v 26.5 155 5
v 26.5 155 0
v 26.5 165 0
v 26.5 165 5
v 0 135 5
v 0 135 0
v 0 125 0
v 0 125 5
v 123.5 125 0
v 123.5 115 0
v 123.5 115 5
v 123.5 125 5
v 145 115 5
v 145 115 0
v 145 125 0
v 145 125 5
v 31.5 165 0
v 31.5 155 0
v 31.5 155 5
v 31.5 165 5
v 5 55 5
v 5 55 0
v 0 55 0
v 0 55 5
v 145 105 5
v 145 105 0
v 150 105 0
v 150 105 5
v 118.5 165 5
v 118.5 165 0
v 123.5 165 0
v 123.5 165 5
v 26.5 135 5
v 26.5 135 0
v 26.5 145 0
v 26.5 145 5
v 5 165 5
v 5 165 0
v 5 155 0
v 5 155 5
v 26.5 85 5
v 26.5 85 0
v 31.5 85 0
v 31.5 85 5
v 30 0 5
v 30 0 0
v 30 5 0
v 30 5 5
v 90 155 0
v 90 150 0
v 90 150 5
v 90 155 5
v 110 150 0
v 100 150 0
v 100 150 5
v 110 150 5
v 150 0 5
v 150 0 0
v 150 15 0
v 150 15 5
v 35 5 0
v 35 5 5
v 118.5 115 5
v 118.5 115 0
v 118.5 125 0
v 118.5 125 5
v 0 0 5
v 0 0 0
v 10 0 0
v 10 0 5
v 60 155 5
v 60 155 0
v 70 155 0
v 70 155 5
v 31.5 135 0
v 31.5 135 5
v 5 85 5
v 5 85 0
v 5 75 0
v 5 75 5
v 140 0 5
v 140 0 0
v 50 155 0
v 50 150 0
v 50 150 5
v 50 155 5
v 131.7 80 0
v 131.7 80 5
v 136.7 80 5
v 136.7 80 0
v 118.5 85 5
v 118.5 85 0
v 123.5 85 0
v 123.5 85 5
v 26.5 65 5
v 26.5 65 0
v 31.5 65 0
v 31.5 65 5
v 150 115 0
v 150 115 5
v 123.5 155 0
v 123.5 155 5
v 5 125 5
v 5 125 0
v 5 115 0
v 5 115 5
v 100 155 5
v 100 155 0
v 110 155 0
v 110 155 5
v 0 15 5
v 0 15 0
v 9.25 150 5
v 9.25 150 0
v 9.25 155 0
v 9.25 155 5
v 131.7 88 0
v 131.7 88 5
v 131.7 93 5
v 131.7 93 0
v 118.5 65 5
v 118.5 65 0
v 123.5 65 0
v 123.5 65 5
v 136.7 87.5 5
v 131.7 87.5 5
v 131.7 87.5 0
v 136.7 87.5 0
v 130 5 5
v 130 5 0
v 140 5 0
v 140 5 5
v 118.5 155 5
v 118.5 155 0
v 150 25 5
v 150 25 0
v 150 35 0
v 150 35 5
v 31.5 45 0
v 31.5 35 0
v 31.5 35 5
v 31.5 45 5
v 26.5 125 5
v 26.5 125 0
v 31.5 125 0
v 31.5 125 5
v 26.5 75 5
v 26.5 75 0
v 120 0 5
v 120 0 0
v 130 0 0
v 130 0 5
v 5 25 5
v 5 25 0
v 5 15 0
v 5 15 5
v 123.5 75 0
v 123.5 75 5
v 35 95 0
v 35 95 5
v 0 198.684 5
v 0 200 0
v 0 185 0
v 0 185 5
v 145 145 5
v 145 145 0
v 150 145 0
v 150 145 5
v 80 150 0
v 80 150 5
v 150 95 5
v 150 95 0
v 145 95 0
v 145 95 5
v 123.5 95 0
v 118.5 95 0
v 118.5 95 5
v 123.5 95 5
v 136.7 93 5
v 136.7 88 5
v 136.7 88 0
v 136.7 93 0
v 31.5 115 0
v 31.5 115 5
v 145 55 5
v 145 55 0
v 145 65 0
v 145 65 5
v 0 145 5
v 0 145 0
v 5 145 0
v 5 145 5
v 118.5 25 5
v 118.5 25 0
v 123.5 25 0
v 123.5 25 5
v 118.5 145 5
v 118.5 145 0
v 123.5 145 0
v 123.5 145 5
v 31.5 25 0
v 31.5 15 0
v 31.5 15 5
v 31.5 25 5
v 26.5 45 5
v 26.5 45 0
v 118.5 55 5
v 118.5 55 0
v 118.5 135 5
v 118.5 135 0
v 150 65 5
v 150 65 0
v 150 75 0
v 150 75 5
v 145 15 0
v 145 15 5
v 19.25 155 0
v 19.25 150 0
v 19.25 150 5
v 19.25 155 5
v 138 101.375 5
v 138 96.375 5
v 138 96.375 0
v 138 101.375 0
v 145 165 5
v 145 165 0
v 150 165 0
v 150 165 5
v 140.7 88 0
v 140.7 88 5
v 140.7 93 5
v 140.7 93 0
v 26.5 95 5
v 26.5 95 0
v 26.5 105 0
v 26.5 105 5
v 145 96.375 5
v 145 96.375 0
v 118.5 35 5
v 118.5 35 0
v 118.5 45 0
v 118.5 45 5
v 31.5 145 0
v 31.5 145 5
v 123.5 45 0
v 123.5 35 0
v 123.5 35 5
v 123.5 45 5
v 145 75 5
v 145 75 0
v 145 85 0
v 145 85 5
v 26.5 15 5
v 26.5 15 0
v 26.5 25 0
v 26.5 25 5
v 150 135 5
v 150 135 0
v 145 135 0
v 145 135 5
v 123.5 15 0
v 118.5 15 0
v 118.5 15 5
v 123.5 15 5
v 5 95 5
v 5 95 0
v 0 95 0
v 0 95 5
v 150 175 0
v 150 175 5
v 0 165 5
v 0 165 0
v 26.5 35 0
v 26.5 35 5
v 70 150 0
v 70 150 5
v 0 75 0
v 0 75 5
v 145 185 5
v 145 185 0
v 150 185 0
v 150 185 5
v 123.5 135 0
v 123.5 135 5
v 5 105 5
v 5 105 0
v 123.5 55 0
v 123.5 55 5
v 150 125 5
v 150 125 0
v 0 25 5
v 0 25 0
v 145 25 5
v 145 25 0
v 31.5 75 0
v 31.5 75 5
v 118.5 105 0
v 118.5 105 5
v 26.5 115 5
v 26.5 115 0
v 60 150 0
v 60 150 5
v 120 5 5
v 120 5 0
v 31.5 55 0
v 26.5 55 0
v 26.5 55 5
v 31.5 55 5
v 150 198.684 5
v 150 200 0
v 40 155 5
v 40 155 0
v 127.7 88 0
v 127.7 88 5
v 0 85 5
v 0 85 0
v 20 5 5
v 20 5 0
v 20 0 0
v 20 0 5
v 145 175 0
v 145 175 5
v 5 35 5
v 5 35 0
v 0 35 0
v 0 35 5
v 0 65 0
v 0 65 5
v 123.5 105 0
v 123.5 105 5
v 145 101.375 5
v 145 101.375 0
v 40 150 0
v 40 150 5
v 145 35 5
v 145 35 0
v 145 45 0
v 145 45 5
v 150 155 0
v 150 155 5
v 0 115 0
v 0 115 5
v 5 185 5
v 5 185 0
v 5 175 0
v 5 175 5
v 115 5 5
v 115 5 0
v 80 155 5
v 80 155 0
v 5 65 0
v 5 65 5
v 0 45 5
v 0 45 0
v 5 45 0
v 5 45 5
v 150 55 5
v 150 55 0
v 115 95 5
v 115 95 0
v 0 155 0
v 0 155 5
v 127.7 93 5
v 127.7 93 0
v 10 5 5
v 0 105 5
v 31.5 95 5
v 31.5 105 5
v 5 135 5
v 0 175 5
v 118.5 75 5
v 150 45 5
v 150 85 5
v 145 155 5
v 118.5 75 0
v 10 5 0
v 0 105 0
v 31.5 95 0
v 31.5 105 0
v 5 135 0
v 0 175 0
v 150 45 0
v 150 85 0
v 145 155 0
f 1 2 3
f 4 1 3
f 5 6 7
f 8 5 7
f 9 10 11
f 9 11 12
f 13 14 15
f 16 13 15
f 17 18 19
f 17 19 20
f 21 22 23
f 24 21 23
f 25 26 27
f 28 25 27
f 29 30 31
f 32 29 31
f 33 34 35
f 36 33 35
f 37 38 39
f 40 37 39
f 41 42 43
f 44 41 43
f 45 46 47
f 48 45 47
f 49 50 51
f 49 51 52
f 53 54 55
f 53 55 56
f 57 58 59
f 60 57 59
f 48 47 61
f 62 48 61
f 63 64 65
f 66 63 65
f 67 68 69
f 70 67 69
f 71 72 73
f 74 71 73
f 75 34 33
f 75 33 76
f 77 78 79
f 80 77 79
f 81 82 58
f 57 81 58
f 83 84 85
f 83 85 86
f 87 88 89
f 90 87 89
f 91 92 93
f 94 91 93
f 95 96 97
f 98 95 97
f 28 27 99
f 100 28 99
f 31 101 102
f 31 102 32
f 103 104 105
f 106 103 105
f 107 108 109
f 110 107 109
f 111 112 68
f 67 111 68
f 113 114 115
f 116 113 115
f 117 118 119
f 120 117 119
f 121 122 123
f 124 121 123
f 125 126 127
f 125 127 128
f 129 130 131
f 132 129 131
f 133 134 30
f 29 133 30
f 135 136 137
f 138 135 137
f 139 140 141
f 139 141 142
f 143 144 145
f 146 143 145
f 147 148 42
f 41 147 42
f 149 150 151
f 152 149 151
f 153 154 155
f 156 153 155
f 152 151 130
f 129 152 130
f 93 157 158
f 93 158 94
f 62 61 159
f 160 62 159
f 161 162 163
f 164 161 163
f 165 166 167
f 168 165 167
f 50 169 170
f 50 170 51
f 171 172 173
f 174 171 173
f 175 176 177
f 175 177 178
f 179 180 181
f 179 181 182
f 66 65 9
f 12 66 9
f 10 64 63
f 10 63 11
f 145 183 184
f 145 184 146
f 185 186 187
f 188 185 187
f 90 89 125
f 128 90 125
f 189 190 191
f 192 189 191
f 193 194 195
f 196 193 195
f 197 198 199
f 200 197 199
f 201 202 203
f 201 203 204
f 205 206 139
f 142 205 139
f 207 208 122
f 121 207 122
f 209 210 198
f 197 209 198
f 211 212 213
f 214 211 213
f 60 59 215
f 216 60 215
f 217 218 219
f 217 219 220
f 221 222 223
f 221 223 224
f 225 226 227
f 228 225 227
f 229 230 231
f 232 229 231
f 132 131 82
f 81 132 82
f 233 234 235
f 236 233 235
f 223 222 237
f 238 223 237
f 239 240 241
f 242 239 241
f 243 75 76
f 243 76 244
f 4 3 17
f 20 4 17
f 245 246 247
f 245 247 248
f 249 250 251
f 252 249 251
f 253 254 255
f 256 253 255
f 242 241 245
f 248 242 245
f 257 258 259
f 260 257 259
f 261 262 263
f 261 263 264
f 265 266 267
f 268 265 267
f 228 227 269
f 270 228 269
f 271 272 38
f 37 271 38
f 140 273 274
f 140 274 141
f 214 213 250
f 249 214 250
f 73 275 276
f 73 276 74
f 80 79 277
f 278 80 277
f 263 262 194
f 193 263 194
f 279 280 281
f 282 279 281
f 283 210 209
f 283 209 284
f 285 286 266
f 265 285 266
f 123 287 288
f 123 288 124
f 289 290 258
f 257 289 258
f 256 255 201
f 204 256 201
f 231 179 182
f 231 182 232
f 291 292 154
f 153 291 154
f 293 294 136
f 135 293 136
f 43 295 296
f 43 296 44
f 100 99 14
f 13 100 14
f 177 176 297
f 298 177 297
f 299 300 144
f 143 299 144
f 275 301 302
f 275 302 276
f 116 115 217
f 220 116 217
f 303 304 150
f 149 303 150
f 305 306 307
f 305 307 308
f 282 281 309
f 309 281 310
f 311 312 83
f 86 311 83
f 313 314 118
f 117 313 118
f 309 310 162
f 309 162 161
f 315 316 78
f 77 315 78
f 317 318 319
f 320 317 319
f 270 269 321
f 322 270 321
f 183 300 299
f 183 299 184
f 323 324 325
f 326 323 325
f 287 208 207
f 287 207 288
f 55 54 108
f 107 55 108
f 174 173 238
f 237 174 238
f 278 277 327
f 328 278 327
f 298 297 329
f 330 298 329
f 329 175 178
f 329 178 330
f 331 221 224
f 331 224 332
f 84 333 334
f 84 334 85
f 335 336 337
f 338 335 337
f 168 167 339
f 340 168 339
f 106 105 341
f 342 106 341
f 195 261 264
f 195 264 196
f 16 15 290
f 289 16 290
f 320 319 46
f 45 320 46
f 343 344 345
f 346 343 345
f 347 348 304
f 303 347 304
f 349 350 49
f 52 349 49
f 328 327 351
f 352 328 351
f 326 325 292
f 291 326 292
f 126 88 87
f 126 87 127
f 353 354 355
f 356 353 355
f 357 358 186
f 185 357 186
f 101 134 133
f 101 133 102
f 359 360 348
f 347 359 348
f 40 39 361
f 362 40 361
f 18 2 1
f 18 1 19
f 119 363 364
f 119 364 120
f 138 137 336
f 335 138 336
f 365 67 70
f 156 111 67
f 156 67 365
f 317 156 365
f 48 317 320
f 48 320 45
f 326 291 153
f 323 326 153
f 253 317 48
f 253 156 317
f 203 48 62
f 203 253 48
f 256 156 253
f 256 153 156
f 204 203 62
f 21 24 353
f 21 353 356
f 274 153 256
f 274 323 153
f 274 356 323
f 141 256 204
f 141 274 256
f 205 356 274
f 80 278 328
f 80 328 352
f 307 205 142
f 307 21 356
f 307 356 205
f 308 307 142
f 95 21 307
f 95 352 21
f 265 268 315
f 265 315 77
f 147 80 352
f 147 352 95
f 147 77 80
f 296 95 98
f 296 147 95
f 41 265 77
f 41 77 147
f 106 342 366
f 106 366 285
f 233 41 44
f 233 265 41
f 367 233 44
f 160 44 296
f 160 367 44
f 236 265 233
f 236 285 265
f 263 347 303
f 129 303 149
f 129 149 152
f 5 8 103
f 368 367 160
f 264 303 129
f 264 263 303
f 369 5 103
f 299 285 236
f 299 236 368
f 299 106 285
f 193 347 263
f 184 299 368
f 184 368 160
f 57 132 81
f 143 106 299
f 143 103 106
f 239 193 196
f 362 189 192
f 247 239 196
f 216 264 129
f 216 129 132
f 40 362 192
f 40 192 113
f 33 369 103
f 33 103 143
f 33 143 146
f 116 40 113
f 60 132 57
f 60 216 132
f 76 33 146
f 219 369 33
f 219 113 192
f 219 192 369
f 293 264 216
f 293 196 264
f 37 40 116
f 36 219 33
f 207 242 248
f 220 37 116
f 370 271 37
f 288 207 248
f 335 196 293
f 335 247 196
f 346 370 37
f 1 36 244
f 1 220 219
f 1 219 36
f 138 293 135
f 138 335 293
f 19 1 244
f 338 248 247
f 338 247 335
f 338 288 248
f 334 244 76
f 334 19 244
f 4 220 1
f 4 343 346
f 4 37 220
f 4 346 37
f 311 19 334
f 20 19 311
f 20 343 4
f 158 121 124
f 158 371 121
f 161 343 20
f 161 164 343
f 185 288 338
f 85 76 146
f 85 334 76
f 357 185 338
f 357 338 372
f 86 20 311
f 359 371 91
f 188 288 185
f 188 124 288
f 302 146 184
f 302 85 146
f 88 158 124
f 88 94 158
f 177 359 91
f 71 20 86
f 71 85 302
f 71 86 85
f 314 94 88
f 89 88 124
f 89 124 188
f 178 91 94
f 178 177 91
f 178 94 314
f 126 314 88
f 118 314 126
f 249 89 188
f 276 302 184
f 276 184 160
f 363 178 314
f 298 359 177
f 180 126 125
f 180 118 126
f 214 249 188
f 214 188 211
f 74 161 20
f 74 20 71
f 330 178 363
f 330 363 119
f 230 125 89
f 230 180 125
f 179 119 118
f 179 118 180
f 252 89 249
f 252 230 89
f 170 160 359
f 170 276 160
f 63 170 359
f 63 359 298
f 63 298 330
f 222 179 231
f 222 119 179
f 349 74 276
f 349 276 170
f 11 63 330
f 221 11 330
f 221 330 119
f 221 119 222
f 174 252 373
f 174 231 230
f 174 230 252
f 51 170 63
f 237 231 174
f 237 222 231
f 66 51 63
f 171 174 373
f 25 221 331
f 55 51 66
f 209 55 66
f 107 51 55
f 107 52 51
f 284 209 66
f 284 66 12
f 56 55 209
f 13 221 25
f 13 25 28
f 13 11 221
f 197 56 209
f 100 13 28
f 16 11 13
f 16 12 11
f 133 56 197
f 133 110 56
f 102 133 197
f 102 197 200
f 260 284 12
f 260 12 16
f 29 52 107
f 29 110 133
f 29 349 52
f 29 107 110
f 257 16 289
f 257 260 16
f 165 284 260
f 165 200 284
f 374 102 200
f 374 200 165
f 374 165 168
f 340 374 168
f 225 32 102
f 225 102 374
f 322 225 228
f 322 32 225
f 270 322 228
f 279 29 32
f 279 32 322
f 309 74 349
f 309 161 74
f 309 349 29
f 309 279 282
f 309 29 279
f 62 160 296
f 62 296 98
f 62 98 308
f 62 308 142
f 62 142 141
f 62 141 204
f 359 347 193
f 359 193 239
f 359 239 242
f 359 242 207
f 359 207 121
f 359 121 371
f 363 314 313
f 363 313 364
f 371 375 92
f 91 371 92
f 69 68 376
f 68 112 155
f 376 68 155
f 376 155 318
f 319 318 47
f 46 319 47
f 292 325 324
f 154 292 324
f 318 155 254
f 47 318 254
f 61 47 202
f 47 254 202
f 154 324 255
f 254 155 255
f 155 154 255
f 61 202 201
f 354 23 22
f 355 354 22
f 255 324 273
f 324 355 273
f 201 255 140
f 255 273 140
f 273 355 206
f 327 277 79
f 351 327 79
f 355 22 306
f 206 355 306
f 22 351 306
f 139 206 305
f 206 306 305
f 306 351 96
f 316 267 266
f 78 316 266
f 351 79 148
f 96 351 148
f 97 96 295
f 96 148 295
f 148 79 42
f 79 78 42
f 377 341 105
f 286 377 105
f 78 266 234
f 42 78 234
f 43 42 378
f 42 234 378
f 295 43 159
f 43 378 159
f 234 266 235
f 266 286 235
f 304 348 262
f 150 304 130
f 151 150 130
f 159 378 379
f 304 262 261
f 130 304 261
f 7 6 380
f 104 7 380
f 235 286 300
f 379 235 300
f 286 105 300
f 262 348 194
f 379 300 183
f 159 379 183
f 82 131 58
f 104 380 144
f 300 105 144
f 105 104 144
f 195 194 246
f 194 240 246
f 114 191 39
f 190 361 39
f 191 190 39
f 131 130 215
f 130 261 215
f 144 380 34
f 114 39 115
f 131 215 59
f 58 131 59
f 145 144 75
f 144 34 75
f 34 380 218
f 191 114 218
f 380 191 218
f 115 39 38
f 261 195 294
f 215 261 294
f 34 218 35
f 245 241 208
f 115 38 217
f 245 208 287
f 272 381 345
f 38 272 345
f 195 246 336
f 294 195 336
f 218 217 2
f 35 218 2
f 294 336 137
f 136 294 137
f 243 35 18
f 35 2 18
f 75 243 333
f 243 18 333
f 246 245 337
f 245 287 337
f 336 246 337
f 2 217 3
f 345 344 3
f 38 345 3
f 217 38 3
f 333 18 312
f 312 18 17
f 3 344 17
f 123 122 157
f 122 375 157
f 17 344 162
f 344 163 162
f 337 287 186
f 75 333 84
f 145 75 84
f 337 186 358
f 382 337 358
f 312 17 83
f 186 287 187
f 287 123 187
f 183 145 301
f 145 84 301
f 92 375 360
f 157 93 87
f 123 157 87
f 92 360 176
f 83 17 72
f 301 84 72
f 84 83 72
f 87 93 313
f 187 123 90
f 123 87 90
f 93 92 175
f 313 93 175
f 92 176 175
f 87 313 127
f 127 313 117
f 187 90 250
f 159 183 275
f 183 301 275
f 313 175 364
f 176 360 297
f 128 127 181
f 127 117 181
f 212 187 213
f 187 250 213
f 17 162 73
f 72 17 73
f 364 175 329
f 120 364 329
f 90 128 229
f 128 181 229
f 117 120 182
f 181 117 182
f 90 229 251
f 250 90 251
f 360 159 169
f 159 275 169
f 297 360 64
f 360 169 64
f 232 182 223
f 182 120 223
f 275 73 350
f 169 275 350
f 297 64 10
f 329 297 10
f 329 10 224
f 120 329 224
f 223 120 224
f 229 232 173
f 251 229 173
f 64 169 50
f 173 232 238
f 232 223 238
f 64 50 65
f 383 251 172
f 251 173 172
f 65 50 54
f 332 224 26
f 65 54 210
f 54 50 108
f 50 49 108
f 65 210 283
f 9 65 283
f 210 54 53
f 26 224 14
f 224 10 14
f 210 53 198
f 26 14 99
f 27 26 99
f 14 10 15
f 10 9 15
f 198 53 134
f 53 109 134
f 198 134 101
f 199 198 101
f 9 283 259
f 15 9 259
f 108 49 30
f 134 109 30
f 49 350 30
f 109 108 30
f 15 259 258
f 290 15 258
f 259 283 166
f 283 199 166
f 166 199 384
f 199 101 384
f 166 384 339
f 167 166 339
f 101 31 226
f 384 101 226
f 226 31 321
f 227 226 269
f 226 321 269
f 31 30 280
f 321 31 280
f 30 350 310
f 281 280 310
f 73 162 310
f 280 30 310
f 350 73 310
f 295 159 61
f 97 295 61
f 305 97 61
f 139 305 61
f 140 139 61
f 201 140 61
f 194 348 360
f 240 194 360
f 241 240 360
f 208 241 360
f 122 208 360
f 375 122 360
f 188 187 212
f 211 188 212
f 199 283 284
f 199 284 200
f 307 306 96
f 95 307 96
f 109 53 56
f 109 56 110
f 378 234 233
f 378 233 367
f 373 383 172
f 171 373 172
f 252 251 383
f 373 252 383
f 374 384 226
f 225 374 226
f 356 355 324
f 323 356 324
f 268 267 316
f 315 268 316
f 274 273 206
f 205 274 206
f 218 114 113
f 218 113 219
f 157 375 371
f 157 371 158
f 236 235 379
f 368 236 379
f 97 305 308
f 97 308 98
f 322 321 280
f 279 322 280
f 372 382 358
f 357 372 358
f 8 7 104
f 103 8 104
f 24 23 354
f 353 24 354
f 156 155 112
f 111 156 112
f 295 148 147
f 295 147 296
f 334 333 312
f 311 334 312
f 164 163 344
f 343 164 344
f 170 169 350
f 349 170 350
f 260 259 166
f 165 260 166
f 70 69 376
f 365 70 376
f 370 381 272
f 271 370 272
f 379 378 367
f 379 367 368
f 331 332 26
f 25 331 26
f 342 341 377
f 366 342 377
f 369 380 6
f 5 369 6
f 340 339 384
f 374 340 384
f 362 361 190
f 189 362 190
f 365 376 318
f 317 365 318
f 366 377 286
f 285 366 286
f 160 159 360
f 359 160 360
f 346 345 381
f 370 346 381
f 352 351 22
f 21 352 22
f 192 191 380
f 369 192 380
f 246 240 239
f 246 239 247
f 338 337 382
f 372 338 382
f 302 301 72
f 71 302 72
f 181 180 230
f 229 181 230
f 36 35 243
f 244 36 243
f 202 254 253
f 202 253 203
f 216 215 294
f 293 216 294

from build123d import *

# Parameters (mm, degrees)
CROQUIS1_W              = 5
CROQUIS1_H              = 10
CROQUIS1_W_2            = 10
CROQUIS1_H_2            = 5
SALIENTE_EXTRUIR1_DEPTH = 5
CORTAR_EXTRUIR7_DEPTH   = 151
CROQUIS8_W              = 4
CROQUIS8_H              = 5
CROQUIS8_W_2            = 5
CROQUIS8_H_2            = 7.5
CROQUIS8_W_3            = 7
CORTAR_EXTRUIR12_DEPTH  = 10


with BuildPart() as part:
    # Croquis1 → Saliente-Extruir1 (new body)
    with BuildSketch(Plane.XY):
        Polygon((0, 0), (10, 0), (10, 5), (20, 5), (20, 0), (30, 0), (30, 5), (35, 5), (35, 95), (115, 95), (115, 5), (117.5, 5), (120, 5), (120, 0), (130, 0), (130, 5), (140, 5), (140, 0), (150, 0), (150, 15), (145, 15), (145, 25), (150, 25), (150, 35), (145, 35), (145, 45), (150, 45), (150, 55), (145, 55), (145, 65), (150, 65), (150, 75), (145, 75), (145, 85), (150, 85), (150, 95), (145, 95), (145, 105), (150, 105), (150, 115), (145, 115), (145, 125), (150, 125), (150, 135), (145, 135), (145, 145), (150, 145), (150, 155), (145, 155), (145, 165), (150, 165), (150, 175), (145, 175), (145, 185), (150, 185), (150, 200), (0, 200), (0, 185), (5, 185), (5, 175), (0, 175), (0, 165), (5, 165), (5, 155), (0, 155), (0, 145), (5, 145), (5, 135), (0, 135), (0, 125), (5, 125), (5, 115), (0, 115), (0, 105), (5, 105), (5, 95), (0, 95), (0, 85), (5, 85), (5, 75), (0, 75), (0, 65), (5, 65), (5, 55), (0, 55), (0, 45), (5, 45), (5, 35), (0, 35), (0, 25), (5, 25), (5, 15), (0, 15), align=None)
        with Locations((28.99995, 20)):
            Rectangle(CROQUIS1_W, CROQUIS1_H, mode=Mode.SUBTRACT)
        with Locations((28.99995, 40)):
            Rectangle(CROQUIS1_W, CROQUIS1_H, mode=Mode.SUBTRACT)
        with Locations((28.99995, 60)):
            Rectangle(CROQUIS1_W, CROQUIS1_H, mode=Mode.SUBTRACT)
        with Locations((28.99995, 80)):
            Rectangle(CROQUIS1_W, CROQUIS1_H, mode=Mode.SUBTRACT)
        with Locations((28.99995, 100)):
            Rectangle(CROQUIS1_W, CROQUIS1_H, mode=Mode.SUBTRACT)
        with Locations((121.00005, 20)):
            Rectangle(CROQUIS1_W, CROQUIS1_H, mode=Mode.SUBTRACT)
        with Locations((121.00005, 40)):
            Rectangle(CROQUIS1_W, CROQUIS1_H, mode=Mode.SUBTRACT)
        with Locations((121.0005, 60)):
            Rectangle(CROQUIS1_W, CROQUIS1_H, mode=Mode.SUBTRACT)
        with Locations((121.00005, 80)):
            Rectangle(CROQUIS1_W, CROQUIS1_H, mode=Mode.SUBTRACT)
        with Locations((121.00005, 100)):
            Rectangle(CROQUIS1_W, CROQUIS1_H, mode=Mode.SUBTRACT)
        with Locations((28.99995, 120)):
            Rectangle(CROQUIS1_W, CROQUIS1_H, mode=Mode.SUBTRACT)
        with Locations((28.99995, 140)):
            Rectangle(CROQUIS1_W, CROQUIS1_H, mode=Mode.SUBTRACT)
        with Locations((14.25, 152.5)):
            Rectangle(CROQUIS1_W_2, CROQUIS1_H_2, mode=Mode.SUBTRACT)
        with Locations((28.99995, 160)):
            Rectangle(CROQUIS1_W, CROQUIS1_H, mode=Mode.SUBTRACT)
        with Locations((45, 152.5)):
            Rectangle(CROQUIS1_W_2, CROQUIS1_H_2, mode=Mode.SUBTRACT)
        with Locations((65, 152.5)):
            Rectangle(CROQUIS1_W_2, CROQUIS1_H_2, mode=Mode.SUBTRACT)
        with Locations((121.00005, 120)):
            Rectangle(CROQUIS1_W, CROQUIS1_H, mode=Mode.SUBTRACT)
        with Locations((121.00005, 140)):
            Rectangle(CROQUIS1_W, CROQUIS1_H, mode=Mode.SUBTRACT)
        with Locations((85, 152.5)):
            Rectangle(CROQUIS1_W_2, CROQUIS1_H_2, mode=Mode.SUBTRACT)
        with Locations((105, 152.5)):
            Rectangle(CROQUIS1_W_2, CROQUIS1_H_2, mode=Mode.SUBTRACT)
        with Locations((121.00005, 160)):
            Rectangle(CROQUIS1_W, CROQUIS1_H, mode=Mode.SUBTRACT)
    extrude(amount=SALIENTE_EXTRUIR1_DEPTH)

    # Croquis7 → Cortar-Extruir7 (cut, through all)
    with BuildSketch(Plane.ZY):
        Polygon((0, 200), (5.317351356, 198.600697011), (5, 200), align=None)
    extrude(amount=-CORTAR_EXTRUIR7_DEPTH, mode=Mode.SUBTRACT)

    # Croquis8 → Cortar-Extruir12 (cut)
    with BuildSketch(Plane.XY.offset(5)):
        with Locations((129.70005, 90.5)):
            Rectangle(CROQUIS8_W, CROQUIS8_H)
        with Locations((134.20005, 83.75)):
            Rectangle(CROQUIS8_W_2, CROQUIS8_H_2)
        with Locations((138.70005, 90.5)):
            Rectangle(CROQUIS8_W, CROQUIS8_H)
        with Locations((141.5, 98.875)):
            Rectangle(CROQUIS8_W_3, CROQUIS8_H)
    extrude(amount=-CORTAR_EXTRUIR12_DEPTH, mode=Mode.SUBTRACT)


solid = part.part
